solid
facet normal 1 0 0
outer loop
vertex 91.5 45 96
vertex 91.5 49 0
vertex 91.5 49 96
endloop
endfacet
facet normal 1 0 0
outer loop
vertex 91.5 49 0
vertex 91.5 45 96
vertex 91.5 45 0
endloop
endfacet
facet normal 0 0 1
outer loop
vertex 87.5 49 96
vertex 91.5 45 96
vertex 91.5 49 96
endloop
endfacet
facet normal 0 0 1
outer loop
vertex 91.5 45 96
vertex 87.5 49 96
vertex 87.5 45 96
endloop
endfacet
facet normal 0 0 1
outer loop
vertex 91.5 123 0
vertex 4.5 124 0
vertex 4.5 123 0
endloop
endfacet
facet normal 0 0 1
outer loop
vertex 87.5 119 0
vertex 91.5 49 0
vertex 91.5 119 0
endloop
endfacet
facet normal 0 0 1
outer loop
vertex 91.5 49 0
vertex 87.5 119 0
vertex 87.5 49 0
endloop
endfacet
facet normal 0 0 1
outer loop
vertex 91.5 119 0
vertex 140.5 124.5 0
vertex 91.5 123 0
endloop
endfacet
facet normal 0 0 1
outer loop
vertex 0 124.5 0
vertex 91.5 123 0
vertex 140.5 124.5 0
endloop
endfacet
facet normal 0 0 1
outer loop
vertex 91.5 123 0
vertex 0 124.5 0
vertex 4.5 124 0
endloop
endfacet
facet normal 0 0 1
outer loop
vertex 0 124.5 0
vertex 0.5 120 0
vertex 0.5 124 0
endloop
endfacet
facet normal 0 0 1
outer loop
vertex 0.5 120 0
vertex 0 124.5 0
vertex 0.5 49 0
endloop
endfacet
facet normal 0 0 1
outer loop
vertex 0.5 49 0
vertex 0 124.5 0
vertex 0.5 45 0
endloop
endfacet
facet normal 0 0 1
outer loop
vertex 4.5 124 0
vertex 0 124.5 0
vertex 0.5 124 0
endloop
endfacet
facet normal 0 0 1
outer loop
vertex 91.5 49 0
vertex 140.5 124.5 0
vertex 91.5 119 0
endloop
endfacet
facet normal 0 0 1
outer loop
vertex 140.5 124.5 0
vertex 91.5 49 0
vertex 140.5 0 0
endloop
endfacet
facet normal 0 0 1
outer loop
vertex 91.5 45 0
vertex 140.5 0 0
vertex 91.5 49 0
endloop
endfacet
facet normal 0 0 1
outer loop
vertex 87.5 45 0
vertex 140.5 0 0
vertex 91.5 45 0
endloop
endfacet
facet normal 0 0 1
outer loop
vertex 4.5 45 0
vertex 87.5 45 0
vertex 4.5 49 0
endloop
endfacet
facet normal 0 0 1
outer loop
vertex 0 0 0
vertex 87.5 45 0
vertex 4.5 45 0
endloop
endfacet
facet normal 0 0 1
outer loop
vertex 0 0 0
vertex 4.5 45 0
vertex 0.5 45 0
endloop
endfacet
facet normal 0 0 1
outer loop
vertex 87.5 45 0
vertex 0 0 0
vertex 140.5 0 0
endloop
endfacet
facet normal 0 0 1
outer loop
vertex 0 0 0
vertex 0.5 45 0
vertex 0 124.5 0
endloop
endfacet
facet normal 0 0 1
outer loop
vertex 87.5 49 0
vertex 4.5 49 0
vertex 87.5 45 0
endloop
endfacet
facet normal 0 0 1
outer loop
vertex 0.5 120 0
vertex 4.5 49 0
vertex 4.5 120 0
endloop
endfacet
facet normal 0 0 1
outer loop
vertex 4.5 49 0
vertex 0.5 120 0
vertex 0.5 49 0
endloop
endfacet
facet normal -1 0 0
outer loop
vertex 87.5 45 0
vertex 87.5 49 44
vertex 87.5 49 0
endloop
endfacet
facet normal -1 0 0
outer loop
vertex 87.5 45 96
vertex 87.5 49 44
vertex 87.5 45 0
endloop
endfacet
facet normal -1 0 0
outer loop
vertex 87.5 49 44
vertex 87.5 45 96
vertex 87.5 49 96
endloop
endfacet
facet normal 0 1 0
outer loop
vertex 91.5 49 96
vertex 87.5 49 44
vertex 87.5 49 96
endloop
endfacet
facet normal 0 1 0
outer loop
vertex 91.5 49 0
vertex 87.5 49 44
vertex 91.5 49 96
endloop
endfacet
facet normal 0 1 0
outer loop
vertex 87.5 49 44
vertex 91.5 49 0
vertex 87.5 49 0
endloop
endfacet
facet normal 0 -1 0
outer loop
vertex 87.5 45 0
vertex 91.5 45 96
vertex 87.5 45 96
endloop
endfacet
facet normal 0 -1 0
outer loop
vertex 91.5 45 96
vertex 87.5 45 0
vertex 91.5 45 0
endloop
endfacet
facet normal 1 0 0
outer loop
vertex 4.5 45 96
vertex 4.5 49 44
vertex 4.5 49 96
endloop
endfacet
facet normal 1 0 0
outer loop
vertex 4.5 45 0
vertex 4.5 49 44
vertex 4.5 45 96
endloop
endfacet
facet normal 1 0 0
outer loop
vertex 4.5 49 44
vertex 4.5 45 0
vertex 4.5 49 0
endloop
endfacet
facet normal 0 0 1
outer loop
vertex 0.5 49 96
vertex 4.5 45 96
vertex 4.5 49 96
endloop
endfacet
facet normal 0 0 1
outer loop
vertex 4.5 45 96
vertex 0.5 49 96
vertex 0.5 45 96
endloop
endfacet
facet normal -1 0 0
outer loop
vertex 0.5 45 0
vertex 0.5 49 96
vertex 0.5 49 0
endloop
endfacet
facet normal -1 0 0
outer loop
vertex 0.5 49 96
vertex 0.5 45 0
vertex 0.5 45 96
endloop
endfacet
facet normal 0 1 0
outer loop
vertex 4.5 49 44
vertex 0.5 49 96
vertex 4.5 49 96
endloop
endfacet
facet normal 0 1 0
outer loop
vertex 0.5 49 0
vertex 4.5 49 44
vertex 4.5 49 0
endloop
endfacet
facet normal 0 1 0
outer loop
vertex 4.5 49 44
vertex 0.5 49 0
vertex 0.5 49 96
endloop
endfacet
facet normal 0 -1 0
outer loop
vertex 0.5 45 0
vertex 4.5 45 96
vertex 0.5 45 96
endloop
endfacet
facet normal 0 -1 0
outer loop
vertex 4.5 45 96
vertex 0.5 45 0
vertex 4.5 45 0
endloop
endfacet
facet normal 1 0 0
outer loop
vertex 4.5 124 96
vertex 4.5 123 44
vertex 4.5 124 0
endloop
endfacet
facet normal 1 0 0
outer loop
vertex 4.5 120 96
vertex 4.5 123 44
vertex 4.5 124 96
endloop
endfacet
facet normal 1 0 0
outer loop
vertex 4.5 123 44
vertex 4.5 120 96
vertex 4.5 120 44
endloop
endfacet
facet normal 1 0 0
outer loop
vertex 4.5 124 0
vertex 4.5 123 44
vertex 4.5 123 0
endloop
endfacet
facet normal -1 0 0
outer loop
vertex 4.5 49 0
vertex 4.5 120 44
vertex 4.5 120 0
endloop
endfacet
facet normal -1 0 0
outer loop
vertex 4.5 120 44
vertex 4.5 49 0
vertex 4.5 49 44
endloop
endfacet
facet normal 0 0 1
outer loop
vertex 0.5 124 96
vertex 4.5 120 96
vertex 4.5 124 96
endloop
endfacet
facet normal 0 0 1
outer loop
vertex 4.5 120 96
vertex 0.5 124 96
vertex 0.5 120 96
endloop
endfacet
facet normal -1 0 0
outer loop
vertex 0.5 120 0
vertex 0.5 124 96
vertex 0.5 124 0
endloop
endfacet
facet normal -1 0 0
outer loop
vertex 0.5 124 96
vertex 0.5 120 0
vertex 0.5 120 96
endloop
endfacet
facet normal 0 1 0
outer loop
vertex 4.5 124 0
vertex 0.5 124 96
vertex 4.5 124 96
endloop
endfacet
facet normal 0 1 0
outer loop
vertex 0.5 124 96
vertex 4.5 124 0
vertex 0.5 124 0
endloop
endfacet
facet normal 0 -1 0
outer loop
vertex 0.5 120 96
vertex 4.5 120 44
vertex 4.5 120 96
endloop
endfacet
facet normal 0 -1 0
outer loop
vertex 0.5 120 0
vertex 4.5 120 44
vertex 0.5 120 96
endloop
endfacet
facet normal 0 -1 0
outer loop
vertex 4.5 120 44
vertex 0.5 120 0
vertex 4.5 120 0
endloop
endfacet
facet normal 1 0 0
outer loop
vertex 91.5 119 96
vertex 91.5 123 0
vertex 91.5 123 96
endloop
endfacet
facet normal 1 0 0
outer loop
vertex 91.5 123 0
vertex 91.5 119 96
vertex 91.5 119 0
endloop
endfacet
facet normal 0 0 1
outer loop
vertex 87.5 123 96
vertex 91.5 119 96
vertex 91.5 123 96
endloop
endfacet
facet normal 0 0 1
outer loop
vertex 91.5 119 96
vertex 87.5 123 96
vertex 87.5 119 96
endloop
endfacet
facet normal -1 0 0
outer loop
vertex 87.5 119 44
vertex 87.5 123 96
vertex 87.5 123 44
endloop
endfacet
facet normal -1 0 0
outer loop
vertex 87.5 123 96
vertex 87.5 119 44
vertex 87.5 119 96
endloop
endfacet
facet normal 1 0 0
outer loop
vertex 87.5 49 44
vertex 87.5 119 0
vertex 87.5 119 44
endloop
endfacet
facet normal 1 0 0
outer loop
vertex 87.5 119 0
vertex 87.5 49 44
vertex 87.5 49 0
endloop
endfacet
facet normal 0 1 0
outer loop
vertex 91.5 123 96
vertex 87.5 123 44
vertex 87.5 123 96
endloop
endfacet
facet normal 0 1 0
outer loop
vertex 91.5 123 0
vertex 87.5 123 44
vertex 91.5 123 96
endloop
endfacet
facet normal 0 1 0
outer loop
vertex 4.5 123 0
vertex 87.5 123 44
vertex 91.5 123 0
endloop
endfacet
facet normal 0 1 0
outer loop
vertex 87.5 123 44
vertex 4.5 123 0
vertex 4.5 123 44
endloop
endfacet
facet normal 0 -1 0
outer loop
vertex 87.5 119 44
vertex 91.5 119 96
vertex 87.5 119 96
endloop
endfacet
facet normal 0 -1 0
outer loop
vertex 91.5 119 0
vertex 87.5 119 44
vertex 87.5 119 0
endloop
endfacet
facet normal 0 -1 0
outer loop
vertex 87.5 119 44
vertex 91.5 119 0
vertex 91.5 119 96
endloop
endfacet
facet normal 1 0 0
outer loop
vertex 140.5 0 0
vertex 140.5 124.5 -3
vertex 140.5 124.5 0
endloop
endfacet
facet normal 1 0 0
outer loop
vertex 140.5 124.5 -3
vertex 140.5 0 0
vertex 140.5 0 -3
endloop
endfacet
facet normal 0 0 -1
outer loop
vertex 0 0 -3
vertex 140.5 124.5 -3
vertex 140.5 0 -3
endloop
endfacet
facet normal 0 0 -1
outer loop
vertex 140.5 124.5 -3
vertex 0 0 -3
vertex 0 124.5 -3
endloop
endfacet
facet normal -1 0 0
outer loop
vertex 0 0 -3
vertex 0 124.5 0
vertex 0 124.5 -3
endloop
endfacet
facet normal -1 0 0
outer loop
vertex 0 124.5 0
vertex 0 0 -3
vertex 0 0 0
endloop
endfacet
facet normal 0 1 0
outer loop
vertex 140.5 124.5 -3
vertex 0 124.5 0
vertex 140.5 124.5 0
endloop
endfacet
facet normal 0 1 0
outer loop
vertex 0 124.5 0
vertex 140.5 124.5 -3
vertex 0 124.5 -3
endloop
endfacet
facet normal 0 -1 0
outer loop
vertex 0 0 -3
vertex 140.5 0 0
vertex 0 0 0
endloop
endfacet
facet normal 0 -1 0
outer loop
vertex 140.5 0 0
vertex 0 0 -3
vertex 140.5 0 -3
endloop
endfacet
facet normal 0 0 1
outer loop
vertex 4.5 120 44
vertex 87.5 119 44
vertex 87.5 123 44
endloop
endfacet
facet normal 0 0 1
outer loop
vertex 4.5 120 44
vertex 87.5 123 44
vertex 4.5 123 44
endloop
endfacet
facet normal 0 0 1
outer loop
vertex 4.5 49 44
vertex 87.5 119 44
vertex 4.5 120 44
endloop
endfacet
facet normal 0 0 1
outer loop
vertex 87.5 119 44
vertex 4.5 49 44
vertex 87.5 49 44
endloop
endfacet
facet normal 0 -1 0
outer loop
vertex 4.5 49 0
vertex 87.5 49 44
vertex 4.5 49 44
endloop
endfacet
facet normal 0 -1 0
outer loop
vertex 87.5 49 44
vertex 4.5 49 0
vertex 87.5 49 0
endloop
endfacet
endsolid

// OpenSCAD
//Jos thing

BED_WIDTH = 74;
BED_LENGTH = 83;
BED_HEIGHT = 44; //Height of roof

ROOM_HEIGHT = 96;



module ground(){
    color("PaleTurquoise", 1)
    translate([0, 0, -3])
    cube([140.5, 124.5, 3]);
}

module mat(){
    color("Turquoise", 1)
    translate([0.5, 50, 0])
    translate([4, -1, 0,])
    cube([BED_LENGTH, BED_WIDTH, BED_HEIGHT]);
}

module legs(){
    
    //frontRight
    translate([BED_LENGTH + 4.5, 45, 0])
    cube([4, 4, ROOM_HEIGHT]);
    
    //backRight
    translate([0.5, 45, 0])
    cube([4, 4, ROOM_HEIGHT]);
    
    //backLeft
    translate([0.5, 120, 0])
    cube([4, 4, ROOM_HEIGHT]);
    
    //frontLeft
    translate([BED_LENGTH + 4.5, 119, 0])
    cube([4, 4, ROOM_HEIGHT]);
}







module main(){
    ground();
    mat();
    
    legs();
}main();
